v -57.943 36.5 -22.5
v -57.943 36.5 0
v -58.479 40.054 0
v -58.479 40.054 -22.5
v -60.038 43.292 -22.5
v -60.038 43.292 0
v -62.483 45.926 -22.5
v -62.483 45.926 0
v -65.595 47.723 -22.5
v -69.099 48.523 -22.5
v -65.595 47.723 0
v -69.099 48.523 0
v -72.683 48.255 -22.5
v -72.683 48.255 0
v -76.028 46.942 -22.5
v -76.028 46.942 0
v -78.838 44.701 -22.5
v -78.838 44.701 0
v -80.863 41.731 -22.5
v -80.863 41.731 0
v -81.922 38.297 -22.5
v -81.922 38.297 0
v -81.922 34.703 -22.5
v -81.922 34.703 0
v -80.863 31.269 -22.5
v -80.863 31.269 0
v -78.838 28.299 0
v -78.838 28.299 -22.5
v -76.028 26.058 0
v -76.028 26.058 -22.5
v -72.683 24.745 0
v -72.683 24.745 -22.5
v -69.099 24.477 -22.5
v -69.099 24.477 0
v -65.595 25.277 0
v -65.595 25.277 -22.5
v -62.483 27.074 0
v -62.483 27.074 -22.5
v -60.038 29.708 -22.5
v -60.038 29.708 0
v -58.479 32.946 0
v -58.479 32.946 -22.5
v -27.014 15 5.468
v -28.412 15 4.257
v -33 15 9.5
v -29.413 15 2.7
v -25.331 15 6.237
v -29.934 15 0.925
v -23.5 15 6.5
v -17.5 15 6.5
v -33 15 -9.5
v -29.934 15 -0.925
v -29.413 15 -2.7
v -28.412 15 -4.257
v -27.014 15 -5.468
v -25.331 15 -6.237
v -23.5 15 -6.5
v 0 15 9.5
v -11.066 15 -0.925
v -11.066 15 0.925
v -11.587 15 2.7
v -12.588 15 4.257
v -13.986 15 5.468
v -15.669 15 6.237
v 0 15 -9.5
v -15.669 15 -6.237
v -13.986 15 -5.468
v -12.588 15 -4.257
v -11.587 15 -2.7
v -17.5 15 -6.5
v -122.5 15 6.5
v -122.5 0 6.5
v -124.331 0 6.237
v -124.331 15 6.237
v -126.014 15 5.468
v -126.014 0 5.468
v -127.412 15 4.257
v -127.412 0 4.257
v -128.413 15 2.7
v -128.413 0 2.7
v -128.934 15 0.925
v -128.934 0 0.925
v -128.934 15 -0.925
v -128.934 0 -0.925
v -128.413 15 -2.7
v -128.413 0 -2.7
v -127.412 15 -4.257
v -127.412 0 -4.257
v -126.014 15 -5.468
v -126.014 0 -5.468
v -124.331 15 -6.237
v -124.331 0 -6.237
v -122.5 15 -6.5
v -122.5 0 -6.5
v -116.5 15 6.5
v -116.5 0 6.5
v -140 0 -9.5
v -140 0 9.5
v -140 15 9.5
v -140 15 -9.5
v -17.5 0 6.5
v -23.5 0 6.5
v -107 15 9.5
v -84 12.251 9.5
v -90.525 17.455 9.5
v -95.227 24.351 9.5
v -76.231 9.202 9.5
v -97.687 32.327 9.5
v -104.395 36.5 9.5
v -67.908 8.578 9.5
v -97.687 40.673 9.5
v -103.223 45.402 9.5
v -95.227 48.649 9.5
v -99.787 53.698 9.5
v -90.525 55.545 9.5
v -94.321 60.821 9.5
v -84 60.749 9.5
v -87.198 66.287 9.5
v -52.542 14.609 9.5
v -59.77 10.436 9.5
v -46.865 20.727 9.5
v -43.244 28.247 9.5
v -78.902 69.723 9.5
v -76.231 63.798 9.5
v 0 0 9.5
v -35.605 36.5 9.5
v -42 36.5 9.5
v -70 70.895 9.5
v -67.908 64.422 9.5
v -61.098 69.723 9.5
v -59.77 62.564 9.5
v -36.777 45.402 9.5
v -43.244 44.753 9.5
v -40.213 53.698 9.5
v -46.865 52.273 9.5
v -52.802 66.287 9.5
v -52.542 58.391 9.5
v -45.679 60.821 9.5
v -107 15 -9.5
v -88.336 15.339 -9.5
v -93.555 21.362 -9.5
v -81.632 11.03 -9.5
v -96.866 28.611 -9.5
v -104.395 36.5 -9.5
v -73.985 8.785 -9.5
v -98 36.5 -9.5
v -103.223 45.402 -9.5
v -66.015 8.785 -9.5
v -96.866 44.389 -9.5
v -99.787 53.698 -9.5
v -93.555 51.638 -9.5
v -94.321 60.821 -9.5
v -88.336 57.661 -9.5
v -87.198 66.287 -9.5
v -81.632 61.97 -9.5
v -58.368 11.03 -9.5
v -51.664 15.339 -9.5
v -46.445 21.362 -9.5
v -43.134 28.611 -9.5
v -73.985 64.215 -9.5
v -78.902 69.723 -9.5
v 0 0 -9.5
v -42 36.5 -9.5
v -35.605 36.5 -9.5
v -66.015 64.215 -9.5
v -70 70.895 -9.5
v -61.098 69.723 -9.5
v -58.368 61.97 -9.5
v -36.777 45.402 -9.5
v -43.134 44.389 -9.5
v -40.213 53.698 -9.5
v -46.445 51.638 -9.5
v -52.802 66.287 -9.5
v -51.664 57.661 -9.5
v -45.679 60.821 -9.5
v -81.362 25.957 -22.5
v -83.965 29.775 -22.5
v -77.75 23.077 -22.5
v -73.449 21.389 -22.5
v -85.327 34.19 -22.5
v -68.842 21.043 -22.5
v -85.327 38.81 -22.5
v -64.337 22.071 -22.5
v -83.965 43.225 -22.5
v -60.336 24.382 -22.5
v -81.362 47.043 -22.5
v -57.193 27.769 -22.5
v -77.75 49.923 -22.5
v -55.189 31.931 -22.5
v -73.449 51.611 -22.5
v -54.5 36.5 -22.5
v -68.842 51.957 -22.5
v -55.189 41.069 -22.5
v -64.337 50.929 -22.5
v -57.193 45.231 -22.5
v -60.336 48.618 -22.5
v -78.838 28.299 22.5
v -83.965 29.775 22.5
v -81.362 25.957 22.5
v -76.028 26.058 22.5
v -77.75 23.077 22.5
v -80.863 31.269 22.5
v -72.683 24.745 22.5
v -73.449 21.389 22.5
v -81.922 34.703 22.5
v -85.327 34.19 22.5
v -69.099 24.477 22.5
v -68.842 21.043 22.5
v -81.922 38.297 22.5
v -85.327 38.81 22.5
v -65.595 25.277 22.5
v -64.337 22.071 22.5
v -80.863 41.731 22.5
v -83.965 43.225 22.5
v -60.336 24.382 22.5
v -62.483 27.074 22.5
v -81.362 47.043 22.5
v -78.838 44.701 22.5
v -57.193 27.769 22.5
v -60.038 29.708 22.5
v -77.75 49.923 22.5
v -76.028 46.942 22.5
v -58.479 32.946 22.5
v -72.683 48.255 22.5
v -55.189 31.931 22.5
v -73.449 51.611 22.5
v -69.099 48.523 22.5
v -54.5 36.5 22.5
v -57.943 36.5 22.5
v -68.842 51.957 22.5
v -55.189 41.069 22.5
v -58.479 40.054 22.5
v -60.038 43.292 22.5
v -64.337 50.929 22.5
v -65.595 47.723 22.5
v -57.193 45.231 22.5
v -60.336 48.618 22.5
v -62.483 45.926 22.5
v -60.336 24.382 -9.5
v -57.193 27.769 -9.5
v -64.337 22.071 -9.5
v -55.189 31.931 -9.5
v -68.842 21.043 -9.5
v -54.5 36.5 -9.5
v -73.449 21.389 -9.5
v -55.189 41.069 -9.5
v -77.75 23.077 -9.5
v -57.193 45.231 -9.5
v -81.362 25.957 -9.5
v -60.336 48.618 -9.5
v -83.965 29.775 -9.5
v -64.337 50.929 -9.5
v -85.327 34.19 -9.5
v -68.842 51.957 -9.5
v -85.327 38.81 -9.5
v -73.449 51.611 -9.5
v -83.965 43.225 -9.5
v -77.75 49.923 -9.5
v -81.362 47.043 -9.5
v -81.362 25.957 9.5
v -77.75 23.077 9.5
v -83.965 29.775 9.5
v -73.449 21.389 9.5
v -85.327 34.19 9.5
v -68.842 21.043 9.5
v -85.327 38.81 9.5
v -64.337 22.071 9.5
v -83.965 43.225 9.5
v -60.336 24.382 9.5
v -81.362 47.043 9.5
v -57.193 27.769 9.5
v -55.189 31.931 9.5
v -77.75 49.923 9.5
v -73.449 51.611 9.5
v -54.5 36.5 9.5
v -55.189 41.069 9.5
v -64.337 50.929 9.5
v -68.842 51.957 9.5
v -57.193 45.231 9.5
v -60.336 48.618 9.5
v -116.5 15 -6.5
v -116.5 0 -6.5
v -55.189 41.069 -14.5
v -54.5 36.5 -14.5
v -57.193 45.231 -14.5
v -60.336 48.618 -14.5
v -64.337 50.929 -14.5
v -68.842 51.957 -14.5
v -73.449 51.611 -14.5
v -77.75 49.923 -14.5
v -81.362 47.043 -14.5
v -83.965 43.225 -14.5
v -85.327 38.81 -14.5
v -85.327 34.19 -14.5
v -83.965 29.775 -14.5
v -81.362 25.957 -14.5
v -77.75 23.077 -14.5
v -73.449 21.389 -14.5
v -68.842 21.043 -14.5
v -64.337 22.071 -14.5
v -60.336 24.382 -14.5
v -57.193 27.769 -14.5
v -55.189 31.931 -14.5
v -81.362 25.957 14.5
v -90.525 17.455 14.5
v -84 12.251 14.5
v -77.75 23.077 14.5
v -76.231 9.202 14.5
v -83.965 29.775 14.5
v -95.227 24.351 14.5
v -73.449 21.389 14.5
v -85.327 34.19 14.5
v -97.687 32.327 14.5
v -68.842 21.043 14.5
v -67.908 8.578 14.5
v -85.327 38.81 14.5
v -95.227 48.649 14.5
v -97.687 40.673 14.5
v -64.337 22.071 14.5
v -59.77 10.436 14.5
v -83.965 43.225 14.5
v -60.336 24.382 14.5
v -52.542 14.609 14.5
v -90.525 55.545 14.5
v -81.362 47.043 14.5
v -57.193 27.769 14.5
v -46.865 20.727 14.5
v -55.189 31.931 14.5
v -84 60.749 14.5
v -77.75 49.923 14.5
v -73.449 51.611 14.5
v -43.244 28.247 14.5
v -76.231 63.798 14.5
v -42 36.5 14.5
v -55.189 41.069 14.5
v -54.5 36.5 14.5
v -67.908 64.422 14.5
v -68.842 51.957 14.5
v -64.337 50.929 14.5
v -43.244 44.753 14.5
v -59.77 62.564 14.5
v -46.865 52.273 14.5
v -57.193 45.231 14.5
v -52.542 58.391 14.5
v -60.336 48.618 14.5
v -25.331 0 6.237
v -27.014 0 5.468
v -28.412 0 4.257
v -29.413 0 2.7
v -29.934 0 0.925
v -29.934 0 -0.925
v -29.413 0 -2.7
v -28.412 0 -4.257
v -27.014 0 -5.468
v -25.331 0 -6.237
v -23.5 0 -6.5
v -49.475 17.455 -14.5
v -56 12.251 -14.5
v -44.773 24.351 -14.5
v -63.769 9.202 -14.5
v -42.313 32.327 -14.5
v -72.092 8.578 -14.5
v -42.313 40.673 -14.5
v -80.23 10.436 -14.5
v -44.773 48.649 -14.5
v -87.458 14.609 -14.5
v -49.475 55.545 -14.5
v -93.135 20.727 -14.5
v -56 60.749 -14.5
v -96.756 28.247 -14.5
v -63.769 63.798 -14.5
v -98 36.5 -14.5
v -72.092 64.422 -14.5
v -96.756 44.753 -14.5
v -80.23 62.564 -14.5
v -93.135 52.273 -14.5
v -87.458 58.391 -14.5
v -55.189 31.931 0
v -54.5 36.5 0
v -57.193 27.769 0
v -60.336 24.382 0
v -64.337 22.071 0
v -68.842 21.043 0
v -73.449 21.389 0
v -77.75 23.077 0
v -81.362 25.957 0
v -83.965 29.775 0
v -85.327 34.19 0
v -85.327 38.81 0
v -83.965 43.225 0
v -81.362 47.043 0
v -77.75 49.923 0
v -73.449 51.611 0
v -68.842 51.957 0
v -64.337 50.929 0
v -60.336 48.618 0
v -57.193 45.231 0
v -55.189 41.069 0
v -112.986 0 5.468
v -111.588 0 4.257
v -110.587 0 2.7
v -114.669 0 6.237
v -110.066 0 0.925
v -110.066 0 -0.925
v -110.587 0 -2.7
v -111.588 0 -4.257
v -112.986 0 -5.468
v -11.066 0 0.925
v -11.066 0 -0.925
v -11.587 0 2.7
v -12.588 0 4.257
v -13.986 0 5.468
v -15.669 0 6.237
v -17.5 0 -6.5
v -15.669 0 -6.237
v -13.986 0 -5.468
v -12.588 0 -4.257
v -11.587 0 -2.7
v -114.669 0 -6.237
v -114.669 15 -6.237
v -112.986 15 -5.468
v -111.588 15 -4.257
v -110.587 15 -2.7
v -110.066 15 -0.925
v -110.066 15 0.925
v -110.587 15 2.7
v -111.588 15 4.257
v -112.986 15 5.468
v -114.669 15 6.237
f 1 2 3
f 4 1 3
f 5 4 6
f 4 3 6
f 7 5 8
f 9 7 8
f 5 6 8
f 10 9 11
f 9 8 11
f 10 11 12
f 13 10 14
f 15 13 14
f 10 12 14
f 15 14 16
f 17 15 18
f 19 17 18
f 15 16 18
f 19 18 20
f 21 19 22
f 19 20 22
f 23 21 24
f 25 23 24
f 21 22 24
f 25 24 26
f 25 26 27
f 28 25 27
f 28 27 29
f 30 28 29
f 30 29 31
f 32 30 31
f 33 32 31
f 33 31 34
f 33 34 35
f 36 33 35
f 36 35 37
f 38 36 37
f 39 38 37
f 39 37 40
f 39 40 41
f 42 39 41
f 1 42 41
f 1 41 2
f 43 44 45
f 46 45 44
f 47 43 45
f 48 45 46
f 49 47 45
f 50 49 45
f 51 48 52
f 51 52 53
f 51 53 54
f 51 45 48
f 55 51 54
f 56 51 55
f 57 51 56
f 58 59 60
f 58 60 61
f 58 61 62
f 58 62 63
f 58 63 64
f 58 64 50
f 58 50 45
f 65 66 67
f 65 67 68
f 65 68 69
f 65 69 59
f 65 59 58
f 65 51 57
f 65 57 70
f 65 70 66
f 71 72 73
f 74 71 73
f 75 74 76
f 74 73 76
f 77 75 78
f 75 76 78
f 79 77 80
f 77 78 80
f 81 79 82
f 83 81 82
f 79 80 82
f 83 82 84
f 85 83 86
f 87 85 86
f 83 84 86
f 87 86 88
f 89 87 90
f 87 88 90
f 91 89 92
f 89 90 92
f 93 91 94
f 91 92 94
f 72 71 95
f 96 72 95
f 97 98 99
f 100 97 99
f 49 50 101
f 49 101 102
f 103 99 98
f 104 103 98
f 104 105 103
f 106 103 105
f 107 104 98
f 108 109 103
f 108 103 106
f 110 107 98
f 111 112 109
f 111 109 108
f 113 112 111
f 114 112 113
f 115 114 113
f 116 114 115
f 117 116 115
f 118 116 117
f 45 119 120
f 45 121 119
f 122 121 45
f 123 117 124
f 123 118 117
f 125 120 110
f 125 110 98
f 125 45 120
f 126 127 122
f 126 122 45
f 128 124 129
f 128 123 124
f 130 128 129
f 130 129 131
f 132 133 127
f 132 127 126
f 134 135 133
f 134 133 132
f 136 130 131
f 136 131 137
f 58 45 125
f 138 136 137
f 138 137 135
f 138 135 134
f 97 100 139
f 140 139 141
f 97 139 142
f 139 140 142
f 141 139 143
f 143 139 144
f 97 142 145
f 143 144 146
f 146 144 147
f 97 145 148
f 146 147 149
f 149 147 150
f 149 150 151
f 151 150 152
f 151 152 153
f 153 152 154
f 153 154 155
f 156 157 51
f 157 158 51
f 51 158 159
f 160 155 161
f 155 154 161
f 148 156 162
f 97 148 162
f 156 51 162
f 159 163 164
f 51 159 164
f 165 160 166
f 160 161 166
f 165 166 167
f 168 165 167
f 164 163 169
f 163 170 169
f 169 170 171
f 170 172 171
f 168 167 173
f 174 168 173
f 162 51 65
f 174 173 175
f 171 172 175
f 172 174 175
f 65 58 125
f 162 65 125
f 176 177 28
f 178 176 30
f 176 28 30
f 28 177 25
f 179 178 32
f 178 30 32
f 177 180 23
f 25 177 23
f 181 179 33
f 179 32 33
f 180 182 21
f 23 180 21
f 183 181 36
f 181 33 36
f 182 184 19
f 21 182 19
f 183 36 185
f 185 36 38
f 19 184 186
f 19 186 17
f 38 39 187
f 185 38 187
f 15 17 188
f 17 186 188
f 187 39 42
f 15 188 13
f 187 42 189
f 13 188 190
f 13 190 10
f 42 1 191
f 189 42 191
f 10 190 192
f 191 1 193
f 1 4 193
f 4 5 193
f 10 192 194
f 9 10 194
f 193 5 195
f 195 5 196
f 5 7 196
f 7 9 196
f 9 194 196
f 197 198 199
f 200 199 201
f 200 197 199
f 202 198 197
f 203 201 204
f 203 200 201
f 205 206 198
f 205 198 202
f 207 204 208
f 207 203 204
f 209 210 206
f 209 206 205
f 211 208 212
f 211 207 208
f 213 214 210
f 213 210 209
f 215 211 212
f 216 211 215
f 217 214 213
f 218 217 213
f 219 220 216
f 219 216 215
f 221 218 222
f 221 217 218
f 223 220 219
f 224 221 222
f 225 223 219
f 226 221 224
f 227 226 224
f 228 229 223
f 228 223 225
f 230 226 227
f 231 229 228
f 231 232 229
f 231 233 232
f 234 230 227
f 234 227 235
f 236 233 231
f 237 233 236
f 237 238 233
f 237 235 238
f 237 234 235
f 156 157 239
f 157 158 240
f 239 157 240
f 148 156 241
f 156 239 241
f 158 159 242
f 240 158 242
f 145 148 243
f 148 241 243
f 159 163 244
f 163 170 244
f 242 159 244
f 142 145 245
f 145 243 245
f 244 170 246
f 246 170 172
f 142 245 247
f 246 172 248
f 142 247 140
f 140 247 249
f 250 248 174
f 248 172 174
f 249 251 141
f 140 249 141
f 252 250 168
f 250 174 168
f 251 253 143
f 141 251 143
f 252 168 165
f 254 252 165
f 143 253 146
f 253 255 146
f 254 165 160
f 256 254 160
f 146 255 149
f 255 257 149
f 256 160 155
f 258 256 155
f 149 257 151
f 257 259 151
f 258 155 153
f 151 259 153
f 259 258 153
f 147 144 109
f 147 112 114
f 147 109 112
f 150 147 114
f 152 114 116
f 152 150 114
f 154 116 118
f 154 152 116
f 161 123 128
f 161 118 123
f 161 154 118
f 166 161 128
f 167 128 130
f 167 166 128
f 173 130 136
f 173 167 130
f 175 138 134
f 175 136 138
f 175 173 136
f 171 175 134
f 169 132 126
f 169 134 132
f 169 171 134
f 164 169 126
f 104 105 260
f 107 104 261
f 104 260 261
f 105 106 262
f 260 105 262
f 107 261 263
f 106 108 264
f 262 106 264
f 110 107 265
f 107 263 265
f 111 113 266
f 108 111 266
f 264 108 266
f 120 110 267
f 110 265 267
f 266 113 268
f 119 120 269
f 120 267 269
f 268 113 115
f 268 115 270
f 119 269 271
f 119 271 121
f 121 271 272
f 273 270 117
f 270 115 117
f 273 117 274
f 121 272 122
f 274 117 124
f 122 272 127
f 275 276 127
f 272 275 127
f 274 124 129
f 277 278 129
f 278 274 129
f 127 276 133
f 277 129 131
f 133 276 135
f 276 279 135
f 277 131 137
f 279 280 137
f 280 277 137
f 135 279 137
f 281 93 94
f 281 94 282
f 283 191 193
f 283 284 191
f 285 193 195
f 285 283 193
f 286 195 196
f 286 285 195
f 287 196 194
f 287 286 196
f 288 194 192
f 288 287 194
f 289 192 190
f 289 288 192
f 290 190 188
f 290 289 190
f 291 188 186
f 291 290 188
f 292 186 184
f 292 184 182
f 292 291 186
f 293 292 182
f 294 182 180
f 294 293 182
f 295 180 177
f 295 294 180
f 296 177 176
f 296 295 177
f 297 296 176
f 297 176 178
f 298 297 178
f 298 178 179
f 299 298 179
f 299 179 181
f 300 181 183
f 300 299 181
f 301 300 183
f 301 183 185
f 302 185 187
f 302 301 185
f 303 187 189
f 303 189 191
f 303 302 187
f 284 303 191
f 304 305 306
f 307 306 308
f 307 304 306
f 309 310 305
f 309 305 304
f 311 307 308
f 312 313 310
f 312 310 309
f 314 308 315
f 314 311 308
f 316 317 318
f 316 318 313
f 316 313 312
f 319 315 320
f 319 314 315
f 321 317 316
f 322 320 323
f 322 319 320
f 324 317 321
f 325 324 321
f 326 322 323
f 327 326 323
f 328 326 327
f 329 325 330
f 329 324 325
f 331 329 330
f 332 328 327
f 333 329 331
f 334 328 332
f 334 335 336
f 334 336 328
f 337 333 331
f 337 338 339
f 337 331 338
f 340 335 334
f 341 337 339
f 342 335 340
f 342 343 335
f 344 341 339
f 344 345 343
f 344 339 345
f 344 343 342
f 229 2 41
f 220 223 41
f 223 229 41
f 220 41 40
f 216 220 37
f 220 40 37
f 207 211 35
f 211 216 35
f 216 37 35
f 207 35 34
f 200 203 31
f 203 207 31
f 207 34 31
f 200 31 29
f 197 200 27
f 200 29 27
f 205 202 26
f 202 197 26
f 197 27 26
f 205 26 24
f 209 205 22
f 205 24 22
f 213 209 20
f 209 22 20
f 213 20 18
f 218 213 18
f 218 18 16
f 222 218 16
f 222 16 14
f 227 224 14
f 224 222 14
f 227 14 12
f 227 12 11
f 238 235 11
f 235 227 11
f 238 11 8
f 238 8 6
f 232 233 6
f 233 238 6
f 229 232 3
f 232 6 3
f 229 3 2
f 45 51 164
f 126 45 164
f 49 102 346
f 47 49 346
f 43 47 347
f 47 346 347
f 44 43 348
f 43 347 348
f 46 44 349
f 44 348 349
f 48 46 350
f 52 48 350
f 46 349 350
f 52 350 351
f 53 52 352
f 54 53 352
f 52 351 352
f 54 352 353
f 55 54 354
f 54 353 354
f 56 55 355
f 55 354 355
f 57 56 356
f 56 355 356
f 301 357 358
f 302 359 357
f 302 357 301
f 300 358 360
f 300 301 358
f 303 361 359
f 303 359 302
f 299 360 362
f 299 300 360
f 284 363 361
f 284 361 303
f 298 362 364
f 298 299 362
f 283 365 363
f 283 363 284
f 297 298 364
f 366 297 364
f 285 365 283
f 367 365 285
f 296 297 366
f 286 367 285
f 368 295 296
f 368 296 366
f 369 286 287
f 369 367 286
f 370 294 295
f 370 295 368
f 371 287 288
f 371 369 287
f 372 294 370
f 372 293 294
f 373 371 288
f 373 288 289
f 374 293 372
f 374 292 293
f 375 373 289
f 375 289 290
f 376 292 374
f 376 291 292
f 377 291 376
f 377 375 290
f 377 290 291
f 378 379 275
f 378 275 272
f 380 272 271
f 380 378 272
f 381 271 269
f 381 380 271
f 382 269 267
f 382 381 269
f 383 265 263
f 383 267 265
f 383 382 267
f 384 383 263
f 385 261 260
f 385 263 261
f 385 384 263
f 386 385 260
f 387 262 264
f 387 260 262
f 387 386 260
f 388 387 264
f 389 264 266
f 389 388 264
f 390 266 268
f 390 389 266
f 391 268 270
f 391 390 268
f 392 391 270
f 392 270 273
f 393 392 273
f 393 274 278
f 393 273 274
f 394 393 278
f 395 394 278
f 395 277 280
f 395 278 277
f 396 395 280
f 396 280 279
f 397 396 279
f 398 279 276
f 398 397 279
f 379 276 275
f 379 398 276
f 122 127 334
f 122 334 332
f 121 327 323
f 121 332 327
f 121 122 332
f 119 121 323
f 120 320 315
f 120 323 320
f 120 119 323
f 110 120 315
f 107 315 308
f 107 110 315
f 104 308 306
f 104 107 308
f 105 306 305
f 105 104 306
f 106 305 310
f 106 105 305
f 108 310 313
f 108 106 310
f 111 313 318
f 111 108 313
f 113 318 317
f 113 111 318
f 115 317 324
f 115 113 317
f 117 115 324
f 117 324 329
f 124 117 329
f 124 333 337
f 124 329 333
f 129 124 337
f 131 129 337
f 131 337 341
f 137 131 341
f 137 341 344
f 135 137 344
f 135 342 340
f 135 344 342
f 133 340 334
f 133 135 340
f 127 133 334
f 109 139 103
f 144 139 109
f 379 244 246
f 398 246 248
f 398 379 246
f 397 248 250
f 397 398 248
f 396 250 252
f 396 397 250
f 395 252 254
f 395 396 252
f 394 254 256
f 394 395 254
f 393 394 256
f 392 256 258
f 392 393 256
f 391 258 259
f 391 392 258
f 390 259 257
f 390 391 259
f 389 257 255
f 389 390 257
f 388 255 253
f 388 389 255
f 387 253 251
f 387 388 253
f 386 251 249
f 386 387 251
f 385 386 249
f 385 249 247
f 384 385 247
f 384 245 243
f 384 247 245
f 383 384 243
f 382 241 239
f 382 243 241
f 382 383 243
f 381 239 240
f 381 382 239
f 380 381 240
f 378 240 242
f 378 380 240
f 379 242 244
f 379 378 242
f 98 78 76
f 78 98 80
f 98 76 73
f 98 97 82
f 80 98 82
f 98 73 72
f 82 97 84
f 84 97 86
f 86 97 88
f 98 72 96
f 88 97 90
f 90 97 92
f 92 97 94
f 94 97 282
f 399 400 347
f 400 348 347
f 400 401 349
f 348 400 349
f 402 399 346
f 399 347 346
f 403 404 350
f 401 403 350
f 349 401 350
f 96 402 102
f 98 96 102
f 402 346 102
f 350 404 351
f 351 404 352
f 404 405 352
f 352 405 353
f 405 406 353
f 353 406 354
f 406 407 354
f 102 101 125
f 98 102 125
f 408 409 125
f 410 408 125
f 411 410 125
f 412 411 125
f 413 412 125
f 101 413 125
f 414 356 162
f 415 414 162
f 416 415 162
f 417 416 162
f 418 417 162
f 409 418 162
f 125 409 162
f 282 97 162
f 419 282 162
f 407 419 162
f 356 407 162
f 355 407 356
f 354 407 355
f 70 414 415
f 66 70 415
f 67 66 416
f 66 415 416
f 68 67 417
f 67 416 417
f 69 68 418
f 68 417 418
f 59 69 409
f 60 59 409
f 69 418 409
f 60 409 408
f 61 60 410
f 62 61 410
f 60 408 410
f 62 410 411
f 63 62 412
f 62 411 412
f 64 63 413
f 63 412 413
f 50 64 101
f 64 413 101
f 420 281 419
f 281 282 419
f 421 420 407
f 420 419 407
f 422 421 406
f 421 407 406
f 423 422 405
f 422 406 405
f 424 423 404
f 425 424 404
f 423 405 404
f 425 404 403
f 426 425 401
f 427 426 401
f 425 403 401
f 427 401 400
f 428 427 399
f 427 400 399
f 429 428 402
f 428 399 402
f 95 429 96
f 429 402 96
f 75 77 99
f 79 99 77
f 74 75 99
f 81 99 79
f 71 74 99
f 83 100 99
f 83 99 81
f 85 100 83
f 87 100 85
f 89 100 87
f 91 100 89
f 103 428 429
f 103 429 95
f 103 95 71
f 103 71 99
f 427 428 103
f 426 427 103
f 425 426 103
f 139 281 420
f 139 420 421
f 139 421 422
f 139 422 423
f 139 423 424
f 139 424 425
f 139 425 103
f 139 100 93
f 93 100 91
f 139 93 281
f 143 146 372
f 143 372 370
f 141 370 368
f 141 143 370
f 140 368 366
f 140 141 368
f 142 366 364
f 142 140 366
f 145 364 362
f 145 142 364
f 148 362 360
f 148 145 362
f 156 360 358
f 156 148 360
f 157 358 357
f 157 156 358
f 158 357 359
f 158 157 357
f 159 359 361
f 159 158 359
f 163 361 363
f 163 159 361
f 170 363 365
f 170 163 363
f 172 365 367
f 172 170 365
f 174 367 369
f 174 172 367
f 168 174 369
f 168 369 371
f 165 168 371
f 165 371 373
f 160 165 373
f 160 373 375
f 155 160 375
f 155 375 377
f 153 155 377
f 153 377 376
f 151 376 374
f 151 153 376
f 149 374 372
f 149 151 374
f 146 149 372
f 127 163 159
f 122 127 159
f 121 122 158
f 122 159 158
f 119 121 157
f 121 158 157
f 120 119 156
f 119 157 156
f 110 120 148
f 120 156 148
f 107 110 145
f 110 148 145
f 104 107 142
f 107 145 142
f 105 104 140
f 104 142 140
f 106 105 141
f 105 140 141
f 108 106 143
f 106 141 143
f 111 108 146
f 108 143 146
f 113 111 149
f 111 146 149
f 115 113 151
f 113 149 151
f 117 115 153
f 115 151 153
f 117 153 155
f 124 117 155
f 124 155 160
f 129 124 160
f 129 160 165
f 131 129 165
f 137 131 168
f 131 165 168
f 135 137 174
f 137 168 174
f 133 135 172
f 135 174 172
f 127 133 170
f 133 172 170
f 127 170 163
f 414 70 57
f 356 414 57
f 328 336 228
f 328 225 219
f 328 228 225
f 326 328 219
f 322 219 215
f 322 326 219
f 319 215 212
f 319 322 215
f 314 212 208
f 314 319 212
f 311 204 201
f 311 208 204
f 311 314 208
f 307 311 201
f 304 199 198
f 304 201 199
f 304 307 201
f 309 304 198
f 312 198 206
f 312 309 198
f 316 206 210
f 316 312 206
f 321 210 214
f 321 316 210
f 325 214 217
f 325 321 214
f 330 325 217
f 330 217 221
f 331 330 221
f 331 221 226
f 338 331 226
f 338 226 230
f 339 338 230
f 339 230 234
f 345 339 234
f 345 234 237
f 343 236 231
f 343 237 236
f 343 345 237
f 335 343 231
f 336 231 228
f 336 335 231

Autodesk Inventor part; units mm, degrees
ref_plane "YZ Plane" through (0, 0, 0) normal (1, 0, 0) x (0, 1, 0)
ref_plane "XZ Plane" through (0, 0, 0) normal (0, 1, 0) x (-1, 0, 0)
ref_plane "XY Plane" through (0, 0, 0) normal (0, 0, 1) x (1, 0, 0)
sketch "Sketch1" plane through (0, 0, 0) normal (0, 0, 1) x (1, 0, 0)
  line L0 (-140, 0) -> (-140, 15)
  line L1 (-140, 15) -> (-107, 15)
  line L2 (-33, 15) -> (0, 15)
  line L3 (0, 15) -> (0, 0)
  arc A0 (-35.6047, 36.5) -> (-104.3953, 36.5) centre (-70, 36.5) ccw
  circle A1 centre (-70, 36.5) radius 12.5
  circle A2 centre (-70, 36.5) radius 15.5
  line L4 (-107, 15) -> (-104.3953, 36.5)
  line L5 (-33, 15) -> (-35.6047, 36.5)
  circle A3 centre (-70, 36.5) radius 28
  line L6 (-140, 0) -> (0, 0)
  dimension "d0" = 140
  dimension "d1" = 15
  dimension "d7" = 25
  dimension "d8" = 31
  dimension "d9" = 56
  dimension "d10" = 15
  dimension "d11" = 68.7907
  dimension "d16" = 36.5
  dimension "d17" = 70
  dimension "d20" = 33
  dimension "d21" = 33
  dimension "d22" = 33
  dimension "d23" = 15
  dimension "d24" = 15
  dimension "d26" = 21.5
  dimension "d27" = 21.5
extrude "Extrusion1" add sketch "Sketch1" along normal mid plane 19 contours L0 L1 L4 A0 L5 L2 L3 L6
sketch "Sketch2" plane through (0, 0, 9.5) normal (0, 0, 1) x (1, 0, 0)
  circle A0 centre (-70, 36.5) radius 15.5
  circle A1 centre (-70, 36.5) radius 28
  point P0 (0, 0)
  dimension "d30" = 36.5
  dimension "d31" = 70
  dimension "d32" = 31
  dimension "d33" = 56
extrude "Extrusion2" add sketch "Sketch2" along normal blind 5
sketch "Sketch3" plane through (-70, 36.5, 14.5) normal (0, 0, 1) x (1, 0, 0)
  point P0 (70, -36.5)
sketch "Sketch4" plane through (0, 0, -9.5) normal (0, 0, -1) x (-1, 0, 0)
  circle A0 centre (70, 36.5) radius 15.5
  circle A1 centre (70, 36.5) radius 28
  line L0 (140, 0) -> (140, 15) projected
  point P0 (0, 0)
  dimension "d36" = 31
  dimension "d37" = 56
  dimension "d38" = 70
  dimension "d39" = 36.5
extrude "Extrusion3" add sketch "Sketch4" along normal blind 5
sketch "Sketch5" plane through (0, 0, 0) normal (0, 0, 1) x (1, 0, 0)
  circle A0 centre (-70, 36.5) radius 15.5 projected
  circle A1 centre (-70, 36.5) radius 15.5
  circle A2 centre (-70, 36.5) radius 12.0569
  point P0 (0, 0)
extrude "Extrusion4" add sketch "Sketch5" along normal mid plane 45
sketch "Sketch6" plane through (-140, 0, 9.5) normal (0, -1, 0) x (1, 0, 0)
  line L0 (0, -19) -> (33, -19) projected
  line L1 (140, -19) -> (140, 0) projected
  line L2 (33, 0) -> (0, 0) projected
  line L3 (140, -19) -> (0, -19) projected
  line L4 (0, -19) -> (0, 0) projected
  arc A0 (17.5, -3) -> (17.5, -16) centre (17.5, -9.5) ccw
  arc A1 (23.5, -16) -> (23.5, -3) centre (23.5, -9.5) ccw
  line L5 (17.5, -3) -> (23.5, -3)
  line L6 (17.5, -16) -> (23.5, -16)
  line L7 (54.5, 0) -> (85.5, 0) projected
  arc A2 (122.5, -16) -> (122.5, -3) centre (122.5, -9.5) ccw
  arc A3 (116.5, -3) -> (116.5, -16) centre (116.5, -9.5) ccw
  line L8 (122.5, -3) -> (116.5, -3)
  line L9 (122.5, -16) -> (116.5, -16)
  point P0 (140, -9.5)
  dimension "d50" = 6.5
  dimension "d51" = 6.5
  dimension "d52" = 6.5
  dimension "d53" = 6.5
  dimension "d54" = 6
  dimension "d55" = 6
  dimension "d56" = 6
  dimension "d57" = 6
  dimension "d58" = 17.5
  dimension "d59" = 17.5
  dimension "d60" = 9.5
  dimension "d61" = 9.5
  dimension "d62" = 17.5
  dimension "d63" = 17.5
  dimension "d64" = 17.5
  dimension "d65" = 3
  dimension "d66" = 3
  dimension "d67" = 6
extrude "Extrusion5" cut sketch "Sketch6" against normal through all
properties part number "PillowBlockBearing"
